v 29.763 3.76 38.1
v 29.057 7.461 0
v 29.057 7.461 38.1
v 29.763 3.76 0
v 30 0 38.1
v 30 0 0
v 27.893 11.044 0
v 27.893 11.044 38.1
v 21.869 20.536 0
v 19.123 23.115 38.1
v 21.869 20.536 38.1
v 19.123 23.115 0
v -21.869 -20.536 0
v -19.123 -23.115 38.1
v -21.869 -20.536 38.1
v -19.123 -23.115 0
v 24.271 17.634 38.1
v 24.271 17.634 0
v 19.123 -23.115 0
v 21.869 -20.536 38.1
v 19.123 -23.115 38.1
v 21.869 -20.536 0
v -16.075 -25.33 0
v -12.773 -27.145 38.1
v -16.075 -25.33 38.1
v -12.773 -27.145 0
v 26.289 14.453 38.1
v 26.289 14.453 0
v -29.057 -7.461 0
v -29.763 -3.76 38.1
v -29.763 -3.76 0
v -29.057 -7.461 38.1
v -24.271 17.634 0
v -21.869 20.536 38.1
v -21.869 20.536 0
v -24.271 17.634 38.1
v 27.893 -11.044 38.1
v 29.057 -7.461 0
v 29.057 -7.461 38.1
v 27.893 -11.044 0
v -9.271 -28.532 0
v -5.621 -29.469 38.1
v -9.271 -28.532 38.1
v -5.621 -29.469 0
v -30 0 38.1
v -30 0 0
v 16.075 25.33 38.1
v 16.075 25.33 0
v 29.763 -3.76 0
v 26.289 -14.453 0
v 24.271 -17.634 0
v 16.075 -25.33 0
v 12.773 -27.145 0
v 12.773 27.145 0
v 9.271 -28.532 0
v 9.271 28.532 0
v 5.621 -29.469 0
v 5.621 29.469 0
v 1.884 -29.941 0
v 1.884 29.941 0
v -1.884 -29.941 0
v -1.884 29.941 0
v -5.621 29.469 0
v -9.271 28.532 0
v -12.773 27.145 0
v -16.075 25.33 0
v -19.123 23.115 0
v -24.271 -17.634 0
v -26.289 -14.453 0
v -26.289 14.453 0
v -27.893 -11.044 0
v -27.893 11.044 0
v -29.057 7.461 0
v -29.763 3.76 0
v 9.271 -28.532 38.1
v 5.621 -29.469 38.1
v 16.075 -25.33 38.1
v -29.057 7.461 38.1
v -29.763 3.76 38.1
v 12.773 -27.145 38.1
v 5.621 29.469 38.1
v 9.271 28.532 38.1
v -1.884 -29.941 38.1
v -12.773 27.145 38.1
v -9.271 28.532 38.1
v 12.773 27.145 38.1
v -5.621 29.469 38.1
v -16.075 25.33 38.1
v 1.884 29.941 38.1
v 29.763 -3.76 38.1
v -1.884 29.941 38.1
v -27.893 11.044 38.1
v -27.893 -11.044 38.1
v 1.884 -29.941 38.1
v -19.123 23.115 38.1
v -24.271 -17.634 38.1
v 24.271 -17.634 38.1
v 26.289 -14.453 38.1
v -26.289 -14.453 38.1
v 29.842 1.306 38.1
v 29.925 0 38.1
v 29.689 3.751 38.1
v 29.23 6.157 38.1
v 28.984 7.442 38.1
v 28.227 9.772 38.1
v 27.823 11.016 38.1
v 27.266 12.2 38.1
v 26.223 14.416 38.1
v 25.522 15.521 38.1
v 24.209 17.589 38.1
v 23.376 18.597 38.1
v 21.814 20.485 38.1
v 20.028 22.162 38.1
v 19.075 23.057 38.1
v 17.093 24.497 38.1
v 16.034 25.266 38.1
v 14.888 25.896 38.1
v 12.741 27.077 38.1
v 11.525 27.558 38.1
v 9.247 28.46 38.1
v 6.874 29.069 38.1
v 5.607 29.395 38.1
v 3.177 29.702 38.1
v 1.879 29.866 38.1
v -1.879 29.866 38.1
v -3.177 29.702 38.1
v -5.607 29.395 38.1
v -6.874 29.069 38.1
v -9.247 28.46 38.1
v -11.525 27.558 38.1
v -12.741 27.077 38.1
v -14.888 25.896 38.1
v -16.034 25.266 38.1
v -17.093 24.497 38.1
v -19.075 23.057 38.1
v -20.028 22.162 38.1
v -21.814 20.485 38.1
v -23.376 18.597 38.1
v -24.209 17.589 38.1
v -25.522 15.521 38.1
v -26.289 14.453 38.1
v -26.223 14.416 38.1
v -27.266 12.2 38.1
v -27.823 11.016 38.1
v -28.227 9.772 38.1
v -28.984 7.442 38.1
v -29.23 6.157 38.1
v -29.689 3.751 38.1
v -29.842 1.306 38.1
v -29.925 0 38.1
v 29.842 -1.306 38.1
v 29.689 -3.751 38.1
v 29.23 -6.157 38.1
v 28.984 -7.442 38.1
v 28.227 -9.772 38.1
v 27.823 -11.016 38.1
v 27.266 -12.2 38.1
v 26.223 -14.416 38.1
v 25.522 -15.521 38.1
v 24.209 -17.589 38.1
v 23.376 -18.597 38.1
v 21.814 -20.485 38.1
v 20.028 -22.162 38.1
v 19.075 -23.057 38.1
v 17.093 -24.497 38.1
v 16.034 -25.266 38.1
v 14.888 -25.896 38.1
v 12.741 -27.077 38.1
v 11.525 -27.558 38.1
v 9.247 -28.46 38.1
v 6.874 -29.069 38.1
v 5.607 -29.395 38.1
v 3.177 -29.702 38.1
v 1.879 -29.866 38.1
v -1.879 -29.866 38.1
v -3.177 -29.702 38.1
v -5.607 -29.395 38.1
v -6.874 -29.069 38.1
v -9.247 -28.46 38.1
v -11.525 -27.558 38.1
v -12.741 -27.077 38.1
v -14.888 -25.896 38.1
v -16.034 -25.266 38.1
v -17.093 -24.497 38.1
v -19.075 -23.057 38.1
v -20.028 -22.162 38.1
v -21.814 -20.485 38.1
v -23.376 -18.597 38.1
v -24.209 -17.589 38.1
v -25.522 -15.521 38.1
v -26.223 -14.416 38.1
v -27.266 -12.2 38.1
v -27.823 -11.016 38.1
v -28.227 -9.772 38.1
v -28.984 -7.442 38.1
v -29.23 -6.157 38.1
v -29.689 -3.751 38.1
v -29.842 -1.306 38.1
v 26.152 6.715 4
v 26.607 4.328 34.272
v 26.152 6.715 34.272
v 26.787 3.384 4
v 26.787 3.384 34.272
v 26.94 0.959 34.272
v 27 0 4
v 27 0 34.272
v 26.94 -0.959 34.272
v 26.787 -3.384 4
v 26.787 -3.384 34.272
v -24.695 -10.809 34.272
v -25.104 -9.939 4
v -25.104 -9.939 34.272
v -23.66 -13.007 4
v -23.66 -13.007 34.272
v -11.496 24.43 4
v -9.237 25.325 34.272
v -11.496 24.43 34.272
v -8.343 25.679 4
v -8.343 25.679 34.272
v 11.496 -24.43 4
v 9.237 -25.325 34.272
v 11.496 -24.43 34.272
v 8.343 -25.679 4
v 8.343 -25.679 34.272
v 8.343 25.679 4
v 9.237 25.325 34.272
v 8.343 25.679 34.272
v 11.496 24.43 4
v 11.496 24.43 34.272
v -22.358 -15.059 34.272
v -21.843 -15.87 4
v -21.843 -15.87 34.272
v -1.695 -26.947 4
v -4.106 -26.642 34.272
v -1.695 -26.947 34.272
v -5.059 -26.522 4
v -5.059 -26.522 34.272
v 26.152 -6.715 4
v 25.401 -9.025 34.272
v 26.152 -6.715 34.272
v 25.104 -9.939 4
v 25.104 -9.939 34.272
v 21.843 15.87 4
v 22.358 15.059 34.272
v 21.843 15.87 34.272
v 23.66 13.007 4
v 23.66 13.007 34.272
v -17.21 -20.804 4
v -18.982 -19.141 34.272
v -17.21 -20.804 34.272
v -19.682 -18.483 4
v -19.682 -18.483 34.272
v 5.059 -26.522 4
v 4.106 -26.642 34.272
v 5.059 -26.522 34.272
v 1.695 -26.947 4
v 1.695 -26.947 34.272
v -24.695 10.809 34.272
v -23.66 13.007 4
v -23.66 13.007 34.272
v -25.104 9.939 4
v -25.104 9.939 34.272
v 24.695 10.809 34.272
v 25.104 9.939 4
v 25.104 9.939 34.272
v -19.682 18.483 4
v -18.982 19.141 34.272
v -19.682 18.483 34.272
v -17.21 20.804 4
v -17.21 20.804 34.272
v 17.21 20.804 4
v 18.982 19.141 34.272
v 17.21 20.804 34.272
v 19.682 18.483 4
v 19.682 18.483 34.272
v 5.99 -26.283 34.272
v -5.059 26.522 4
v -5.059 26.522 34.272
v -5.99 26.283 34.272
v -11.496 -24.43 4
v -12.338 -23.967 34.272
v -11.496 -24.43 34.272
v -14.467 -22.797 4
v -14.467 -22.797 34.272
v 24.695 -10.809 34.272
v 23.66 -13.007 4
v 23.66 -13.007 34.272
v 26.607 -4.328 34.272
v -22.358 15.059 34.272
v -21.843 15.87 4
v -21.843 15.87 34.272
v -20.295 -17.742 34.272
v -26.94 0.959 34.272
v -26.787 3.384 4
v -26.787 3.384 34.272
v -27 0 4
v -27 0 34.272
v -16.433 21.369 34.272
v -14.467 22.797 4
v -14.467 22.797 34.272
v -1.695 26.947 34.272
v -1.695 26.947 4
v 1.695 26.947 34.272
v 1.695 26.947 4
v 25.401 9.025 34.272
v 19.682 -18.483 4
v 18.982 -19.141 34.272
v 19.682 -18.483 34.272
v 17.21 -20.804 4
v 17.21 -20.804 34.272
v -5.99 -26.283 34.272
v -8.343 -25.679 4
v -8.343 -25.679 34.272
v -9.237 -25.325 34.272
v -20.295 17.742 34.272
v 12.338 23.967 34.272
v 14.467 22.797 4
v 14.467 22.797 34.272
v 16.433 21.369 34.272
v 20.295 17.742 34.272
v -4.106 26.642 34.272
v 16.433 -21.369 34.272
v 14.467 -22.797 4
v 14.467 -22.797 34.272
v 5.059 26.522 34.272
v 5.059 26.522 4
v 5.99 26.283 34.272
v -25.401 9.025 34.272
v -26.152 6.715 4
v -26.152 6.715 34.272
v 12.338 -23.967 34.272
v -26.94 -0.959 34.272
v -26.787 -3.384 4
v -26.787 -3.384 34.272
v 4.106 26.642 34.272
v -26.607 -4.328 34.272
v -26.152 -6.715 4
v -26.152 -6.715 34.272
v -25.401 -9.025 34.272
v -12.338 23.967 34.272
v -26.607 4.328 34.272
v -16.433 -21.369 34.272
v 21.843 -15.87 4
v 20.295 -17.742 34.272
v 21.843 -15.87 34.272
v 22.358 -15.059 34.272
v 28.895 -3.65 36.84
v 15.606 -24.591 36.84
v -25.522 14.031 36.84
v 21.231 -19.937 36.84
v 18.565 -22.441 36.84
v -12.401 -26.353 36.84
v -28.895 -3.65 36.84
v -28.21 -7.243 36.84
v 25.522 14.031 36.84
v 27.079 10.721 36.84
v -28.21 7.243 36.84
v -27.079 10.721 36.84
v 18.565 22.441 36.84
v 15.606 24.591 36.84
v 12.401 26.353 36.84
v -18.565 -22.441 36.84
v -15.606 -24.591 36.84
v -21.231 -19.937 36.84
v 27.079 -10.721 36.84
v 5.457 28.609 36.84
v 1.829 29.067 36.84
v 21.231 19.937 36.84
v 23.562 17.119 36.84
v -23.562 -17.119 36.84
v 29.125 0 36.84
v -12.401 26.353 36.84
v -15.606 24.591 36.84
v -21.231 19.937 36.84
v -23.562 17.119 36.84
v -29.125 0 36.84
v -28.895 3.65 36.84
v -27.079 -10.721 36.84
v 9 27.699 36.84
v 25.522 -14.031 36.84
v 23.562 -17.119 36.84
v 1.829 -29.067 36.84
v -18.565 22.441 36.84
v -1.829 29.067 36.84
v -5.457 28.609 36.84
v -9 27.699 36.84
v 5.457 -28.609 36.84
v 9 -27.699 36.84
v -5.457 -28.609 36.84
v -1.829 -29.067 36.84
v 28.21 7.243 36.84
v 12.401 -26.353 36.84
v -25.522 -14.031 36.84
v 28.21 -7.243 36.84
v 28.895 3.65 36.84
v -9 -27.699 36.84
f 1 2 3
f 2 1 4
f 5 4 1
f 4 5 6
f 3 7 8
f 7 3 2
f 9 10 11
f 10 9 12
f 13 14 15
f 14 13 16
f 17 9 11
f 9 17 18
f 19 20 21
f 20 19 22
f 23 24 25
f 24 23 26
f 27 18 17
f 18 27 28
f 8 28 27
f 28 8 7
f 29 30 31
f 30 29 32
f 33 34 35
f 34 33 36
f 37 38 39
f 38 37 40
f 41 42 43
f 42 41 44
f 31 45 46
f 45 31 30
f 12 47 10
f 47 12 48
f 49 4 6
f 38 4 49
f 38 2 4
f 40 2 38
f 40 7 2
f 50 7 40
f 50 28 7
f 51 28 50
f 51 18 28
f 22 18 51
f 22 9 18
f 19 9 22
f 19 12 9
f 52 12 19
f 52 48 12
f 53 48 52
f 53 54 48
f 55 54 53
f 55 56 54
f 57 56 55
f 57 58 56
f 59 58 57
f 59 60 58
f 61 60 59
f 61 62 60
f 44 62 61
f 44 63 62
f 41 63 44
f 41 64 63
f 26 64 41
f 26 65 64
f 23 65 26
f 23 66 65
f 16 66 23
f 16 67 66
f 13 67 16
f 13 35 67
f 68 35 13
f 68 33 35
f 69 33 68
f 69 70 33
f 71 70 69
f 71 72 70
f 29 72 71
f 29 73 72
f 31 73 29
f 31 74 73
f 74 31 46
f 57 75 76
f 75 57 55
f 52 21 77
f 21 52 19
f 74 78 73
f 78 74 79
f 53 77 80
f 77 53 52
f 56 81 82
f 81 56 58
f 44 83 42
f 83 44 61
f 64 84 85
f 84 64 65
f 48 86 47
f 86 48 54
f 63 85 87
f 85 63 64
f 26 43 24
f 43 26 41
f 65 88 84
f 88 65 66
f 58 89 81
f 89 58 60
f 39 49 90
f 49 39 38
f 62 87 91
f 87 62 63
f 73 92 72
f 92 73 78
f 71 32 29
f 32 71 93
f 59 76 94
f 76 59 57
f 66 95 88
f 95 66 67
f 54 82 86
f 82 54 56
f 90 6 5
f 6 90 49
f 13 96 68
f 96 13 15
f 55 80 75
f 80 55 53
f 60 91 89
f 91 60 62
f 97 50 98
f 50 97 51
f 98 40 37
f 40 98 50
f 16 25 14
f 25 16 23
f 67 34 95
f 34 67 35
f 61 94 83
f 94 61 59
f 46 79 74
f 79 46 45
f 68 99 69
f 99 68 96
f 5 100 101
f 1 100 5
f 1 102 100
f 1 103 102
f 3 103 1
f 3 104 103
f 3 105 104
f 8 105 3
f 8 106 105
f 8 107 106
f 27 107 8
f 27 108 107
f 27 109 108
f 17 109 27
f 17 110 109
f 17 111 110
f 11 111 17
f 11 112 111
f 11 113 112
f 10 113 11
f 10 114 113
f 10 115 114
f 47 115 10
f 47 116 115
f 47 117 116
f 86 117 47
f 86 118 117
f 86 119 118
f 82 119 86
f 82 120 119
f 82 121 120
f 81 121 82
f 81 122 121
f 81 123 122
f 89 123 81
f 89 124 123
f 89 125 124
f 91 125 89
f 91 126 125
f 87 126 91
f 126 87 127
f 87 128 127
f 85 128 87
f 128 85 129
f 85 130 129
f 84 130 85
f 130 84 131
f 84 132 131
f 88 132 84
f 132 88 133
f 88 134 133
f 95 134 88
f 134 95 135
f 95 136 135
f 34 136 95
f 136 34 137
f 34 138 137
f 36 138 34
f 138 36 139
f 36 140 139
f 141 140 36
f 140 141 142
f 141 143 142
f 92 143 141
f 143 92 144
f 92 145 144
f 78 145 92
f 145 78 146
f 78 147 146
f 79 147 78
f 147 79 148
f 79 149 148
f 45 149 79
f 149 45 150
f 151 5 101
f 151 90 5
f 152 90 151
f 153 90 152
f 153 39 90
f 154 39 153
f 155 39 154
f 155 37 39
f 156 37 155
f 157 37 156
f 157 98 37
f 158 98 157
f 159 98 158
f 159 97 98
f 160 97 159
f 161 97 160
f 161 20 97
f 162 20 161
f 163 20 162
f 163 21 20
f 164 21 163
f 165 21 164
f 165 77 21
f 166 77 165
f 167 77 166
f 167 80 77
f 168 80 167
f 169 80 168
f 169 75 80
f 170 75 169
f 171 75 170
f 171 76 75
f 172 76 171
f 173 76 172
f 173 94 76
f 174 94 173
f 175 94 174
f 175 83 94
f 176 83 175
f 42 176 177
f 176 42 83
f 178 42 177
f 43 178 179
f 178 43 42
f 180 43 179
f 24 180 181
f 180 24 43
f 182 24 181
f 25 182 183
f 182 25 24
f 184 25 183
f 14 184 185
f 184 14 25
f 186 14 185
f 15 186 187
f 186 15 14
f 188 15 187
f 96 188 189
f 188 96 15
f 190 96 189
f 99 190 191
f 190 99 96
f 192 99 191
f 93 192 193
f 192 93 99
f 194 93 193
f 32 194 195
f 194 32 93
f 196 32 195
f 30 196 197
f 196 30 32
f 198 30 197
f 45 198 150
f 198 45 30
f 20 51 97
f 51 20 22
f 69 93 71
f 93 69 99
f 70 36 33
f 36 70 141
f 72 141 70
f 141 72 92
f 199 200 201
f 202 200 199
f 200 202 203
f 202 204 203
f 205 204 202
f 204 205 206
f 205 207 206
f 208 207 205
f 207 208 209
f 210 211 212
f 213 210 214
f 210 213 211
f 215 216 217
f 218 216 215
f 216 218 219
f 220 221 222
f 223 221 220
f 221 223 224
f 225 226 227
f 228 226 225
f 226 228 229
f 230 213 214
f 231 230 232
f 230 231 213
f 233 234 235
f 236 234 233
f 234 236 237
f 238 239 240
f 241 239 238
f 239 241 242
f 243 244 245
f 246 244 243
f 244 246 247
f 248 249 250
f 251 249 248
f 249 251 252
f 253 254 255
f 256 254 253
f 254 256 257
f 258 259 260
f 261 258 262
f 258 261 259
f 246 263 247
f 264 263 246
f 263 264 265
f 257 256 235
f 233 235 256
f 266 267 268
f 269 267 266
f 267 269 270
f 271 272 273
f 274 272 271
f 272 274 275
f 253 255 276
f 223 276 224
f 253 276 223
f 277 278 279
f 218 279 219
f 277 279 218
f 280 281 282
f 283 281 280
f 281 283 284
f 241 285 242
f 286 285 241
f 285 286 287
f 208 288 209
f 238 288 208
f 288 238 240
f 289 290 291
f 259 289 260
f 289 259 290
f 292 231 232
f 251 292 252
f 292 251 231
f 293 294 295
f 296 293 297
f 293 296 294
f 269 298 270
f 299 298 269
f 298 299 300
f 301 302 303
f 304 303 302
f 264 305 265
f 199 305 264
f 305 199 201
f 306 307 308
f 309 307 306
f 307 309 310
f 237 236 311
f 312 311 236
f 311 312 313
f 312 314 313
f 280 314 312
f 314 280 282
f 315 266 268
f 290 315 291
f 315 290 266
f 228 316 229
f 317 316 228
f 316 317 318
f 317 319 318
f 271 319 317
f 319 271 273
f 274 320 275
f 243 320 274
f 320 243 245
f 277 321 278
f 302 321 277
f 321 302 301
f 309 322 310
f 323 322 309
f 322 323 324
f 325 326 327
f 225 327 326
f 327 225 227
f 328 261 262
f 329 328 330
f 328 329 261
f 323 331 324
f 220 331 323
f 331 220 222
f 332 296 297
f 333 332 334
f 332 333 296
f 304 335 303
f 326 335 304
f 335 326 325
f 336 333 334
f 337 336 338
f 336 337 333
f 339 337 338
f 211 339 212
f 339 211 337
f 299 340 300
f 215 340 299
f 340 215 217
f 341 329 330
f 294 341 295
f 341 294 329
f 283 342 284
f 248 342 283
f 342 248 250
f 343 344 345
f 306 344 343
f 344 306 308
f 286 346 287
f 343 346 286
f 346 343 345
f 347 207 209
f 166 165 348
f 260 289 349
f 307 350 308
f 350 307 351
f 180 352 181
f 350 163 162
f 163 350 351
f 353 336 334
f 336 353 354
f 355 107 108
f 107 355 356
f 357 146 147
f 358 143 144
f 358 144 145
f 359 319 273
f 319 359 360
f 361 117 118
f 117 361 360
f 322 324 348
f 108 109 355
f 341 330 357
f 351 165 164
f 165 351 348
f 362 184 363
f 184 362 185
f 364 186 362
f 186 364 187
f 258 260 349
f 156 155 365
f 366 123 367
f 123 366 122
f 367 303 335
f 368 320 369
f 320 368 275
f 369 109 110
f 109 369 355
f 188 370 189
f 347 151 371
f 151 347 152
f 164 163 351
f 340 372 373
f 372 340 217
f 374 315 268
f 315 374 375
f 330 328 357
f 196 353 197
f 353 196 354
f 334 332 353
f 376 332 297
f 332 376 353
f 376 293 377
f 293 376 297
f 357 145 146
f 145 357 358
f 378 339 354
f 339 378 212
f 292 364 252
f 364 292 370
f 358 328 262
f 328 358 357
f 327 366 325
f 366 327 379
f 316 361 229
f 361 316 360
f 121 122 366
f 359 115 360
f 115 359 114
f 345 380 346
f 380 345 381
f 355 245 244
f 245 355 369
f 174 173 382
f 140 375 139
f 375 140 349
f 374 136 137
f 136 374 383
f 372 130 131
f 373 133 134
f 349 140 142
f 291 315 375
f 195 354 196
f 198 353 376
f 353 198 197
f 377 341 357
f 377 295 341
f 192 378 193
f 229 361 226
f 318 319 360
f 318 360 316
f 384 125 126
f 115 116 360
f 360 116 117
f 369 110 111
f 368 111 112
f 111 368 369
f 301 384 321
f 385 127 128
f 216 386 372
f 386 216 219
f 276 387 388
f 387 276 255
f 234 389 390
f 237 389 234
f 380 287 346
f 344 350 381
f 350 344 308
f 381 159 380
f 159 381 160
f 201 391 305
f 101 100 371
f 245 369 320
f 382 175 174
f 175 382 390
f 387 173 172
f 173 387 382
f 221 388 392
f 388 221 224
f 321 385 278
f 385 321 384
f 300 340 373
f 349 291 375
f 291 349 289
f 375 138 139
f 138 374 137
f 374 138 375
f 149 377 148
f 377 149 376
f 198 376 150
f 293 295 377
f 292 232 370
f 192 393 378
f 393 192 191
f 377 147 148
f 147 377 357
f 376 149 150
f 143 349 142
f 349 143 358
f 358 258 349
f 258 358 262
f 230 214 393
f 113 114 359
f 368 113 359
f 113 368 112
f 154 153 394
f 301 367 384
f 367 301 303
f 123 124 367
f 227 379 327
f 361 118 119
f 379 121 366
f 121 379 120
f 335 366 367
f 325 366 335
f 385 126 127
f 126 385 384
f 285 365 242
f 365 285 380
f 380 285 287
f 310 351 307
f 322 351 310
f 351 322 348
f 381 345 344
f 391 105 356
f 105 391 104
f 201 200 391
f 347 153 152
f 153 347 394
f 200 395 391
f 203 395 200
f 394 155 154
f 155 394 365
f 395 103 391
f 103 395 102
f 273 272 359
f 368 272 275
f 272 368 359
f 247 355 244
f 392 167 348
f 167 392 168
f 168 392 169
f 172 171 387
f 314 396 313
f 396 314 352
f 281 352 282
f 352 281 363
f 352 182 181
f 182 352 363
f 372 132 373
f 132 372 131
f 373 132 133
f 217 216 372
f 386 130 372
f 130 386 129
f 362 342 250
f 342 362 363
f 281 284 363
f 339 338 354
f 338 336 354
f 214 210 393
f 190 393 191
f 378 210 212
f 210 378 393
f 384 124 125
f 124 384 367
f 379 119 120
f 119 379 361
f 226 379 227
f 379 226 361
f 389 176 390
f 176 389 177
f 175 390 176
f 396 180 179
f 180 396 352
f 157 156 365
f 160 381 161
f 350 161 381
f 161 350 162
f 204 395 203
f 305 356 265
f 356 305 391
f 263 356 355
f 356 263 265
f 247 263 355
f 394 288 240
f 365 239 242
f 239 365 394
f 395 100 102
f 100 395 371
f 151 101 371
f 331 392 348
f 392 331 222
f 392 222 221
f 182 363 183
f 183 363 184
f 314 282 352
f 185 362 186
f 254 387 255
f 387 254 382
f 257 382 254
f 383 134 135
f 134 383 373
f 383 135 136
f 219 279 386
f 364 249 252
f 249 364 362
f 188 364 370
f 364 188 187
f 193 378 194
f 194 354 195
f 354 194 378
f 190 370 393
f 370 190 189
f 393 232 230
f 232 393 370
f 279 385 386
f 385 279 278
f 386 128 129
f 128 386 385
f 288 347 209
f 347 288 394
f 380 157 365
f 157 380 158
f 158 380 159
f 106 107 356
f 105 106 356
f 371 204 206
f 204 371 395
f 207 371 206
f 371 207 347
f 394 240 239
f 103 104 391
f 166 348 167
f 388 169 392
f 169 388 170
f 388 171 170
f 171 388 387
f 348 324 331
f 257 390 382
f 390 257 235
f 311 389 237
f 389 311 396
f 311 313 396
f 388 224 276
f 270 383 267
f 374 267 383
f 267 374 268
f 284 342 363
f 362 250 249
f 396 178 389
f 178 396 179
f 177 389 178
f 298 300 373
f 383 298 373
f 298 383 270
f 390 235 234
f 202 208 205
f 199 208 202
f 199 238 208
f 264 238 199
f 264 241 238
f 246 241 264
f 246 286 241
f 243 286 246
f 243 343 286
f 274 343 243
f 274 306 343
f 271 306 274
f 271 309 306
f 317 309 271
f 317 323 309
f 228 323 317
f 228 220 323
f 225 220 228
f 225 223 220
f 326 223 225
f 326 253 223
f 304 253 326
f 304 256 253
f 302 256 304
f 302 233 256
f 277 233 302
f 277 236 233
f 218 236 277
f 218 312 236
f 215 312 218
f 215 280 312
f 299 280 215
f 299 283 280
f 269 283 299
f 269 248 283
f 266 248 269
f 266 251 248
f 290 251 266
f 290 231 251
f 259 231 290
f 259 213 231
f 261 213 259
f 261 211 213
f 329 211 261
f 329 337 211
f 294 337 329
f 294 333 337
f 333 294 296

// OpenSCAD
// This is a stand for:
//    Moon https://www.thingiverse.com/thing:2955930,
//    Earth Globe https://www.thingiverse.com/thing:2565357, 
//    Jupiter https://www.thingiverse.com/thing:2747956, 
//    or any other sphere.
// This stand is designed to put a led light in the bottom.
// I use the Ozark Trail 3-LED Headlamp from Walmart which sells for 1 USD in the store.
// https://www.walmart.com/ip/Ozark-Trail-10-Pack-LED-Headlamp-for-Camping-and-Outdoor-Use/49332881
// All measurements are in millimeters.
// The total height of the stand is calculated based on the measurements you provide
// so that the sphere does not touch the lamp.

/* [Parameters] */
// (mm) this is the diameter of the sphere which will rest on top of the stand
sphere_diameter = 72;  

// (mm) if using a lamp, make sure you lamp fits in here  
stand_inner_diameter = 54; 
// (mm) you can set this to zero if you don't need room for a lamp
height_of_lamp = 17; 
// (mm)
gap_between_lamp_and_sphere = 1;

// (mm) you may adjust the wall thickness to make the stand more or less translucent
wall_thickness = 3;
// (mm) you can set this to zero to remove the bottom
bottom_thickness = 4;
// (degrees) decrease this number to create a flared base
flare_angle = 90; // [20:90]
// for flared bases, do you want the inner wall to also be flared?
flare_inner_wall = 0; // [0:no,1:yes]

// number of facets to create the cylinder, use a smaller number for quick preview, larger number before creating the STL
FN = 50; // [8:100]

/* [Hidden] */
$fn=FN;
innerRadius = stand_inner_diameter/2; 
outerRadius = innerRadius + wall_thickness;
outerDiameter = outerRadius*2;
sphereRadius = sphere_diameter/2;
a = acos((sphereRadius*sphereRadius*2-(outerDiameter*outerDiameter))/(2*sphereRadius*sphereRadius));
// this is the height of the portion of the sphere that drops into the outer cylinder
heightOfSphereInCylinder = (sphere_diameter/2) * (1 - cos(a/2));
distanceToBottomOfSphere = bottom_thickness + height_of_lamp + gap_between_lamp_and_sphere;
echo(distanceToBottomOfSphere=distanceToBottomOfSphere);
totalHeight = distanceToBottomOfSphere + heightOfSphereInCylinder;
echo(totalHeight=totalHeight);

addedBaseRadius = (flare_angle < 90) ? totalHeight/tan(flare_angle) : 0;
echo(addedBaseRadius=addedBaseRadius);

difference() {
    cylinder(totalHeight,r1=outerRadius+addedBaseRadius,r2=outerRadius);
    cylinder(totalHeight,r1=innerRadius+(flare_inner_wall==1?addedBaseRadius:0),r2=innerRadius);
    //cylinder(totalHeight,r=outerRadius,true);
    //cylinder(totalHeight,r=innerRadius,true);
    translate([0,0,distanceToBottomOfSphere+sphereRadius]){
        sphere(d=sphere_diameter);
    }
}
if (bottom_thickness > 0){
    rtop = ((flare_angle < 90) ? (bottom_thickness/tan(flare_angle)) : 0);
    echo(rtop=rtop);
    cylinder(bottom_thickness,r1=outerRadius+addedBaseRadius,r2=outerRadius+addedBaseRadius-rtop);
}
